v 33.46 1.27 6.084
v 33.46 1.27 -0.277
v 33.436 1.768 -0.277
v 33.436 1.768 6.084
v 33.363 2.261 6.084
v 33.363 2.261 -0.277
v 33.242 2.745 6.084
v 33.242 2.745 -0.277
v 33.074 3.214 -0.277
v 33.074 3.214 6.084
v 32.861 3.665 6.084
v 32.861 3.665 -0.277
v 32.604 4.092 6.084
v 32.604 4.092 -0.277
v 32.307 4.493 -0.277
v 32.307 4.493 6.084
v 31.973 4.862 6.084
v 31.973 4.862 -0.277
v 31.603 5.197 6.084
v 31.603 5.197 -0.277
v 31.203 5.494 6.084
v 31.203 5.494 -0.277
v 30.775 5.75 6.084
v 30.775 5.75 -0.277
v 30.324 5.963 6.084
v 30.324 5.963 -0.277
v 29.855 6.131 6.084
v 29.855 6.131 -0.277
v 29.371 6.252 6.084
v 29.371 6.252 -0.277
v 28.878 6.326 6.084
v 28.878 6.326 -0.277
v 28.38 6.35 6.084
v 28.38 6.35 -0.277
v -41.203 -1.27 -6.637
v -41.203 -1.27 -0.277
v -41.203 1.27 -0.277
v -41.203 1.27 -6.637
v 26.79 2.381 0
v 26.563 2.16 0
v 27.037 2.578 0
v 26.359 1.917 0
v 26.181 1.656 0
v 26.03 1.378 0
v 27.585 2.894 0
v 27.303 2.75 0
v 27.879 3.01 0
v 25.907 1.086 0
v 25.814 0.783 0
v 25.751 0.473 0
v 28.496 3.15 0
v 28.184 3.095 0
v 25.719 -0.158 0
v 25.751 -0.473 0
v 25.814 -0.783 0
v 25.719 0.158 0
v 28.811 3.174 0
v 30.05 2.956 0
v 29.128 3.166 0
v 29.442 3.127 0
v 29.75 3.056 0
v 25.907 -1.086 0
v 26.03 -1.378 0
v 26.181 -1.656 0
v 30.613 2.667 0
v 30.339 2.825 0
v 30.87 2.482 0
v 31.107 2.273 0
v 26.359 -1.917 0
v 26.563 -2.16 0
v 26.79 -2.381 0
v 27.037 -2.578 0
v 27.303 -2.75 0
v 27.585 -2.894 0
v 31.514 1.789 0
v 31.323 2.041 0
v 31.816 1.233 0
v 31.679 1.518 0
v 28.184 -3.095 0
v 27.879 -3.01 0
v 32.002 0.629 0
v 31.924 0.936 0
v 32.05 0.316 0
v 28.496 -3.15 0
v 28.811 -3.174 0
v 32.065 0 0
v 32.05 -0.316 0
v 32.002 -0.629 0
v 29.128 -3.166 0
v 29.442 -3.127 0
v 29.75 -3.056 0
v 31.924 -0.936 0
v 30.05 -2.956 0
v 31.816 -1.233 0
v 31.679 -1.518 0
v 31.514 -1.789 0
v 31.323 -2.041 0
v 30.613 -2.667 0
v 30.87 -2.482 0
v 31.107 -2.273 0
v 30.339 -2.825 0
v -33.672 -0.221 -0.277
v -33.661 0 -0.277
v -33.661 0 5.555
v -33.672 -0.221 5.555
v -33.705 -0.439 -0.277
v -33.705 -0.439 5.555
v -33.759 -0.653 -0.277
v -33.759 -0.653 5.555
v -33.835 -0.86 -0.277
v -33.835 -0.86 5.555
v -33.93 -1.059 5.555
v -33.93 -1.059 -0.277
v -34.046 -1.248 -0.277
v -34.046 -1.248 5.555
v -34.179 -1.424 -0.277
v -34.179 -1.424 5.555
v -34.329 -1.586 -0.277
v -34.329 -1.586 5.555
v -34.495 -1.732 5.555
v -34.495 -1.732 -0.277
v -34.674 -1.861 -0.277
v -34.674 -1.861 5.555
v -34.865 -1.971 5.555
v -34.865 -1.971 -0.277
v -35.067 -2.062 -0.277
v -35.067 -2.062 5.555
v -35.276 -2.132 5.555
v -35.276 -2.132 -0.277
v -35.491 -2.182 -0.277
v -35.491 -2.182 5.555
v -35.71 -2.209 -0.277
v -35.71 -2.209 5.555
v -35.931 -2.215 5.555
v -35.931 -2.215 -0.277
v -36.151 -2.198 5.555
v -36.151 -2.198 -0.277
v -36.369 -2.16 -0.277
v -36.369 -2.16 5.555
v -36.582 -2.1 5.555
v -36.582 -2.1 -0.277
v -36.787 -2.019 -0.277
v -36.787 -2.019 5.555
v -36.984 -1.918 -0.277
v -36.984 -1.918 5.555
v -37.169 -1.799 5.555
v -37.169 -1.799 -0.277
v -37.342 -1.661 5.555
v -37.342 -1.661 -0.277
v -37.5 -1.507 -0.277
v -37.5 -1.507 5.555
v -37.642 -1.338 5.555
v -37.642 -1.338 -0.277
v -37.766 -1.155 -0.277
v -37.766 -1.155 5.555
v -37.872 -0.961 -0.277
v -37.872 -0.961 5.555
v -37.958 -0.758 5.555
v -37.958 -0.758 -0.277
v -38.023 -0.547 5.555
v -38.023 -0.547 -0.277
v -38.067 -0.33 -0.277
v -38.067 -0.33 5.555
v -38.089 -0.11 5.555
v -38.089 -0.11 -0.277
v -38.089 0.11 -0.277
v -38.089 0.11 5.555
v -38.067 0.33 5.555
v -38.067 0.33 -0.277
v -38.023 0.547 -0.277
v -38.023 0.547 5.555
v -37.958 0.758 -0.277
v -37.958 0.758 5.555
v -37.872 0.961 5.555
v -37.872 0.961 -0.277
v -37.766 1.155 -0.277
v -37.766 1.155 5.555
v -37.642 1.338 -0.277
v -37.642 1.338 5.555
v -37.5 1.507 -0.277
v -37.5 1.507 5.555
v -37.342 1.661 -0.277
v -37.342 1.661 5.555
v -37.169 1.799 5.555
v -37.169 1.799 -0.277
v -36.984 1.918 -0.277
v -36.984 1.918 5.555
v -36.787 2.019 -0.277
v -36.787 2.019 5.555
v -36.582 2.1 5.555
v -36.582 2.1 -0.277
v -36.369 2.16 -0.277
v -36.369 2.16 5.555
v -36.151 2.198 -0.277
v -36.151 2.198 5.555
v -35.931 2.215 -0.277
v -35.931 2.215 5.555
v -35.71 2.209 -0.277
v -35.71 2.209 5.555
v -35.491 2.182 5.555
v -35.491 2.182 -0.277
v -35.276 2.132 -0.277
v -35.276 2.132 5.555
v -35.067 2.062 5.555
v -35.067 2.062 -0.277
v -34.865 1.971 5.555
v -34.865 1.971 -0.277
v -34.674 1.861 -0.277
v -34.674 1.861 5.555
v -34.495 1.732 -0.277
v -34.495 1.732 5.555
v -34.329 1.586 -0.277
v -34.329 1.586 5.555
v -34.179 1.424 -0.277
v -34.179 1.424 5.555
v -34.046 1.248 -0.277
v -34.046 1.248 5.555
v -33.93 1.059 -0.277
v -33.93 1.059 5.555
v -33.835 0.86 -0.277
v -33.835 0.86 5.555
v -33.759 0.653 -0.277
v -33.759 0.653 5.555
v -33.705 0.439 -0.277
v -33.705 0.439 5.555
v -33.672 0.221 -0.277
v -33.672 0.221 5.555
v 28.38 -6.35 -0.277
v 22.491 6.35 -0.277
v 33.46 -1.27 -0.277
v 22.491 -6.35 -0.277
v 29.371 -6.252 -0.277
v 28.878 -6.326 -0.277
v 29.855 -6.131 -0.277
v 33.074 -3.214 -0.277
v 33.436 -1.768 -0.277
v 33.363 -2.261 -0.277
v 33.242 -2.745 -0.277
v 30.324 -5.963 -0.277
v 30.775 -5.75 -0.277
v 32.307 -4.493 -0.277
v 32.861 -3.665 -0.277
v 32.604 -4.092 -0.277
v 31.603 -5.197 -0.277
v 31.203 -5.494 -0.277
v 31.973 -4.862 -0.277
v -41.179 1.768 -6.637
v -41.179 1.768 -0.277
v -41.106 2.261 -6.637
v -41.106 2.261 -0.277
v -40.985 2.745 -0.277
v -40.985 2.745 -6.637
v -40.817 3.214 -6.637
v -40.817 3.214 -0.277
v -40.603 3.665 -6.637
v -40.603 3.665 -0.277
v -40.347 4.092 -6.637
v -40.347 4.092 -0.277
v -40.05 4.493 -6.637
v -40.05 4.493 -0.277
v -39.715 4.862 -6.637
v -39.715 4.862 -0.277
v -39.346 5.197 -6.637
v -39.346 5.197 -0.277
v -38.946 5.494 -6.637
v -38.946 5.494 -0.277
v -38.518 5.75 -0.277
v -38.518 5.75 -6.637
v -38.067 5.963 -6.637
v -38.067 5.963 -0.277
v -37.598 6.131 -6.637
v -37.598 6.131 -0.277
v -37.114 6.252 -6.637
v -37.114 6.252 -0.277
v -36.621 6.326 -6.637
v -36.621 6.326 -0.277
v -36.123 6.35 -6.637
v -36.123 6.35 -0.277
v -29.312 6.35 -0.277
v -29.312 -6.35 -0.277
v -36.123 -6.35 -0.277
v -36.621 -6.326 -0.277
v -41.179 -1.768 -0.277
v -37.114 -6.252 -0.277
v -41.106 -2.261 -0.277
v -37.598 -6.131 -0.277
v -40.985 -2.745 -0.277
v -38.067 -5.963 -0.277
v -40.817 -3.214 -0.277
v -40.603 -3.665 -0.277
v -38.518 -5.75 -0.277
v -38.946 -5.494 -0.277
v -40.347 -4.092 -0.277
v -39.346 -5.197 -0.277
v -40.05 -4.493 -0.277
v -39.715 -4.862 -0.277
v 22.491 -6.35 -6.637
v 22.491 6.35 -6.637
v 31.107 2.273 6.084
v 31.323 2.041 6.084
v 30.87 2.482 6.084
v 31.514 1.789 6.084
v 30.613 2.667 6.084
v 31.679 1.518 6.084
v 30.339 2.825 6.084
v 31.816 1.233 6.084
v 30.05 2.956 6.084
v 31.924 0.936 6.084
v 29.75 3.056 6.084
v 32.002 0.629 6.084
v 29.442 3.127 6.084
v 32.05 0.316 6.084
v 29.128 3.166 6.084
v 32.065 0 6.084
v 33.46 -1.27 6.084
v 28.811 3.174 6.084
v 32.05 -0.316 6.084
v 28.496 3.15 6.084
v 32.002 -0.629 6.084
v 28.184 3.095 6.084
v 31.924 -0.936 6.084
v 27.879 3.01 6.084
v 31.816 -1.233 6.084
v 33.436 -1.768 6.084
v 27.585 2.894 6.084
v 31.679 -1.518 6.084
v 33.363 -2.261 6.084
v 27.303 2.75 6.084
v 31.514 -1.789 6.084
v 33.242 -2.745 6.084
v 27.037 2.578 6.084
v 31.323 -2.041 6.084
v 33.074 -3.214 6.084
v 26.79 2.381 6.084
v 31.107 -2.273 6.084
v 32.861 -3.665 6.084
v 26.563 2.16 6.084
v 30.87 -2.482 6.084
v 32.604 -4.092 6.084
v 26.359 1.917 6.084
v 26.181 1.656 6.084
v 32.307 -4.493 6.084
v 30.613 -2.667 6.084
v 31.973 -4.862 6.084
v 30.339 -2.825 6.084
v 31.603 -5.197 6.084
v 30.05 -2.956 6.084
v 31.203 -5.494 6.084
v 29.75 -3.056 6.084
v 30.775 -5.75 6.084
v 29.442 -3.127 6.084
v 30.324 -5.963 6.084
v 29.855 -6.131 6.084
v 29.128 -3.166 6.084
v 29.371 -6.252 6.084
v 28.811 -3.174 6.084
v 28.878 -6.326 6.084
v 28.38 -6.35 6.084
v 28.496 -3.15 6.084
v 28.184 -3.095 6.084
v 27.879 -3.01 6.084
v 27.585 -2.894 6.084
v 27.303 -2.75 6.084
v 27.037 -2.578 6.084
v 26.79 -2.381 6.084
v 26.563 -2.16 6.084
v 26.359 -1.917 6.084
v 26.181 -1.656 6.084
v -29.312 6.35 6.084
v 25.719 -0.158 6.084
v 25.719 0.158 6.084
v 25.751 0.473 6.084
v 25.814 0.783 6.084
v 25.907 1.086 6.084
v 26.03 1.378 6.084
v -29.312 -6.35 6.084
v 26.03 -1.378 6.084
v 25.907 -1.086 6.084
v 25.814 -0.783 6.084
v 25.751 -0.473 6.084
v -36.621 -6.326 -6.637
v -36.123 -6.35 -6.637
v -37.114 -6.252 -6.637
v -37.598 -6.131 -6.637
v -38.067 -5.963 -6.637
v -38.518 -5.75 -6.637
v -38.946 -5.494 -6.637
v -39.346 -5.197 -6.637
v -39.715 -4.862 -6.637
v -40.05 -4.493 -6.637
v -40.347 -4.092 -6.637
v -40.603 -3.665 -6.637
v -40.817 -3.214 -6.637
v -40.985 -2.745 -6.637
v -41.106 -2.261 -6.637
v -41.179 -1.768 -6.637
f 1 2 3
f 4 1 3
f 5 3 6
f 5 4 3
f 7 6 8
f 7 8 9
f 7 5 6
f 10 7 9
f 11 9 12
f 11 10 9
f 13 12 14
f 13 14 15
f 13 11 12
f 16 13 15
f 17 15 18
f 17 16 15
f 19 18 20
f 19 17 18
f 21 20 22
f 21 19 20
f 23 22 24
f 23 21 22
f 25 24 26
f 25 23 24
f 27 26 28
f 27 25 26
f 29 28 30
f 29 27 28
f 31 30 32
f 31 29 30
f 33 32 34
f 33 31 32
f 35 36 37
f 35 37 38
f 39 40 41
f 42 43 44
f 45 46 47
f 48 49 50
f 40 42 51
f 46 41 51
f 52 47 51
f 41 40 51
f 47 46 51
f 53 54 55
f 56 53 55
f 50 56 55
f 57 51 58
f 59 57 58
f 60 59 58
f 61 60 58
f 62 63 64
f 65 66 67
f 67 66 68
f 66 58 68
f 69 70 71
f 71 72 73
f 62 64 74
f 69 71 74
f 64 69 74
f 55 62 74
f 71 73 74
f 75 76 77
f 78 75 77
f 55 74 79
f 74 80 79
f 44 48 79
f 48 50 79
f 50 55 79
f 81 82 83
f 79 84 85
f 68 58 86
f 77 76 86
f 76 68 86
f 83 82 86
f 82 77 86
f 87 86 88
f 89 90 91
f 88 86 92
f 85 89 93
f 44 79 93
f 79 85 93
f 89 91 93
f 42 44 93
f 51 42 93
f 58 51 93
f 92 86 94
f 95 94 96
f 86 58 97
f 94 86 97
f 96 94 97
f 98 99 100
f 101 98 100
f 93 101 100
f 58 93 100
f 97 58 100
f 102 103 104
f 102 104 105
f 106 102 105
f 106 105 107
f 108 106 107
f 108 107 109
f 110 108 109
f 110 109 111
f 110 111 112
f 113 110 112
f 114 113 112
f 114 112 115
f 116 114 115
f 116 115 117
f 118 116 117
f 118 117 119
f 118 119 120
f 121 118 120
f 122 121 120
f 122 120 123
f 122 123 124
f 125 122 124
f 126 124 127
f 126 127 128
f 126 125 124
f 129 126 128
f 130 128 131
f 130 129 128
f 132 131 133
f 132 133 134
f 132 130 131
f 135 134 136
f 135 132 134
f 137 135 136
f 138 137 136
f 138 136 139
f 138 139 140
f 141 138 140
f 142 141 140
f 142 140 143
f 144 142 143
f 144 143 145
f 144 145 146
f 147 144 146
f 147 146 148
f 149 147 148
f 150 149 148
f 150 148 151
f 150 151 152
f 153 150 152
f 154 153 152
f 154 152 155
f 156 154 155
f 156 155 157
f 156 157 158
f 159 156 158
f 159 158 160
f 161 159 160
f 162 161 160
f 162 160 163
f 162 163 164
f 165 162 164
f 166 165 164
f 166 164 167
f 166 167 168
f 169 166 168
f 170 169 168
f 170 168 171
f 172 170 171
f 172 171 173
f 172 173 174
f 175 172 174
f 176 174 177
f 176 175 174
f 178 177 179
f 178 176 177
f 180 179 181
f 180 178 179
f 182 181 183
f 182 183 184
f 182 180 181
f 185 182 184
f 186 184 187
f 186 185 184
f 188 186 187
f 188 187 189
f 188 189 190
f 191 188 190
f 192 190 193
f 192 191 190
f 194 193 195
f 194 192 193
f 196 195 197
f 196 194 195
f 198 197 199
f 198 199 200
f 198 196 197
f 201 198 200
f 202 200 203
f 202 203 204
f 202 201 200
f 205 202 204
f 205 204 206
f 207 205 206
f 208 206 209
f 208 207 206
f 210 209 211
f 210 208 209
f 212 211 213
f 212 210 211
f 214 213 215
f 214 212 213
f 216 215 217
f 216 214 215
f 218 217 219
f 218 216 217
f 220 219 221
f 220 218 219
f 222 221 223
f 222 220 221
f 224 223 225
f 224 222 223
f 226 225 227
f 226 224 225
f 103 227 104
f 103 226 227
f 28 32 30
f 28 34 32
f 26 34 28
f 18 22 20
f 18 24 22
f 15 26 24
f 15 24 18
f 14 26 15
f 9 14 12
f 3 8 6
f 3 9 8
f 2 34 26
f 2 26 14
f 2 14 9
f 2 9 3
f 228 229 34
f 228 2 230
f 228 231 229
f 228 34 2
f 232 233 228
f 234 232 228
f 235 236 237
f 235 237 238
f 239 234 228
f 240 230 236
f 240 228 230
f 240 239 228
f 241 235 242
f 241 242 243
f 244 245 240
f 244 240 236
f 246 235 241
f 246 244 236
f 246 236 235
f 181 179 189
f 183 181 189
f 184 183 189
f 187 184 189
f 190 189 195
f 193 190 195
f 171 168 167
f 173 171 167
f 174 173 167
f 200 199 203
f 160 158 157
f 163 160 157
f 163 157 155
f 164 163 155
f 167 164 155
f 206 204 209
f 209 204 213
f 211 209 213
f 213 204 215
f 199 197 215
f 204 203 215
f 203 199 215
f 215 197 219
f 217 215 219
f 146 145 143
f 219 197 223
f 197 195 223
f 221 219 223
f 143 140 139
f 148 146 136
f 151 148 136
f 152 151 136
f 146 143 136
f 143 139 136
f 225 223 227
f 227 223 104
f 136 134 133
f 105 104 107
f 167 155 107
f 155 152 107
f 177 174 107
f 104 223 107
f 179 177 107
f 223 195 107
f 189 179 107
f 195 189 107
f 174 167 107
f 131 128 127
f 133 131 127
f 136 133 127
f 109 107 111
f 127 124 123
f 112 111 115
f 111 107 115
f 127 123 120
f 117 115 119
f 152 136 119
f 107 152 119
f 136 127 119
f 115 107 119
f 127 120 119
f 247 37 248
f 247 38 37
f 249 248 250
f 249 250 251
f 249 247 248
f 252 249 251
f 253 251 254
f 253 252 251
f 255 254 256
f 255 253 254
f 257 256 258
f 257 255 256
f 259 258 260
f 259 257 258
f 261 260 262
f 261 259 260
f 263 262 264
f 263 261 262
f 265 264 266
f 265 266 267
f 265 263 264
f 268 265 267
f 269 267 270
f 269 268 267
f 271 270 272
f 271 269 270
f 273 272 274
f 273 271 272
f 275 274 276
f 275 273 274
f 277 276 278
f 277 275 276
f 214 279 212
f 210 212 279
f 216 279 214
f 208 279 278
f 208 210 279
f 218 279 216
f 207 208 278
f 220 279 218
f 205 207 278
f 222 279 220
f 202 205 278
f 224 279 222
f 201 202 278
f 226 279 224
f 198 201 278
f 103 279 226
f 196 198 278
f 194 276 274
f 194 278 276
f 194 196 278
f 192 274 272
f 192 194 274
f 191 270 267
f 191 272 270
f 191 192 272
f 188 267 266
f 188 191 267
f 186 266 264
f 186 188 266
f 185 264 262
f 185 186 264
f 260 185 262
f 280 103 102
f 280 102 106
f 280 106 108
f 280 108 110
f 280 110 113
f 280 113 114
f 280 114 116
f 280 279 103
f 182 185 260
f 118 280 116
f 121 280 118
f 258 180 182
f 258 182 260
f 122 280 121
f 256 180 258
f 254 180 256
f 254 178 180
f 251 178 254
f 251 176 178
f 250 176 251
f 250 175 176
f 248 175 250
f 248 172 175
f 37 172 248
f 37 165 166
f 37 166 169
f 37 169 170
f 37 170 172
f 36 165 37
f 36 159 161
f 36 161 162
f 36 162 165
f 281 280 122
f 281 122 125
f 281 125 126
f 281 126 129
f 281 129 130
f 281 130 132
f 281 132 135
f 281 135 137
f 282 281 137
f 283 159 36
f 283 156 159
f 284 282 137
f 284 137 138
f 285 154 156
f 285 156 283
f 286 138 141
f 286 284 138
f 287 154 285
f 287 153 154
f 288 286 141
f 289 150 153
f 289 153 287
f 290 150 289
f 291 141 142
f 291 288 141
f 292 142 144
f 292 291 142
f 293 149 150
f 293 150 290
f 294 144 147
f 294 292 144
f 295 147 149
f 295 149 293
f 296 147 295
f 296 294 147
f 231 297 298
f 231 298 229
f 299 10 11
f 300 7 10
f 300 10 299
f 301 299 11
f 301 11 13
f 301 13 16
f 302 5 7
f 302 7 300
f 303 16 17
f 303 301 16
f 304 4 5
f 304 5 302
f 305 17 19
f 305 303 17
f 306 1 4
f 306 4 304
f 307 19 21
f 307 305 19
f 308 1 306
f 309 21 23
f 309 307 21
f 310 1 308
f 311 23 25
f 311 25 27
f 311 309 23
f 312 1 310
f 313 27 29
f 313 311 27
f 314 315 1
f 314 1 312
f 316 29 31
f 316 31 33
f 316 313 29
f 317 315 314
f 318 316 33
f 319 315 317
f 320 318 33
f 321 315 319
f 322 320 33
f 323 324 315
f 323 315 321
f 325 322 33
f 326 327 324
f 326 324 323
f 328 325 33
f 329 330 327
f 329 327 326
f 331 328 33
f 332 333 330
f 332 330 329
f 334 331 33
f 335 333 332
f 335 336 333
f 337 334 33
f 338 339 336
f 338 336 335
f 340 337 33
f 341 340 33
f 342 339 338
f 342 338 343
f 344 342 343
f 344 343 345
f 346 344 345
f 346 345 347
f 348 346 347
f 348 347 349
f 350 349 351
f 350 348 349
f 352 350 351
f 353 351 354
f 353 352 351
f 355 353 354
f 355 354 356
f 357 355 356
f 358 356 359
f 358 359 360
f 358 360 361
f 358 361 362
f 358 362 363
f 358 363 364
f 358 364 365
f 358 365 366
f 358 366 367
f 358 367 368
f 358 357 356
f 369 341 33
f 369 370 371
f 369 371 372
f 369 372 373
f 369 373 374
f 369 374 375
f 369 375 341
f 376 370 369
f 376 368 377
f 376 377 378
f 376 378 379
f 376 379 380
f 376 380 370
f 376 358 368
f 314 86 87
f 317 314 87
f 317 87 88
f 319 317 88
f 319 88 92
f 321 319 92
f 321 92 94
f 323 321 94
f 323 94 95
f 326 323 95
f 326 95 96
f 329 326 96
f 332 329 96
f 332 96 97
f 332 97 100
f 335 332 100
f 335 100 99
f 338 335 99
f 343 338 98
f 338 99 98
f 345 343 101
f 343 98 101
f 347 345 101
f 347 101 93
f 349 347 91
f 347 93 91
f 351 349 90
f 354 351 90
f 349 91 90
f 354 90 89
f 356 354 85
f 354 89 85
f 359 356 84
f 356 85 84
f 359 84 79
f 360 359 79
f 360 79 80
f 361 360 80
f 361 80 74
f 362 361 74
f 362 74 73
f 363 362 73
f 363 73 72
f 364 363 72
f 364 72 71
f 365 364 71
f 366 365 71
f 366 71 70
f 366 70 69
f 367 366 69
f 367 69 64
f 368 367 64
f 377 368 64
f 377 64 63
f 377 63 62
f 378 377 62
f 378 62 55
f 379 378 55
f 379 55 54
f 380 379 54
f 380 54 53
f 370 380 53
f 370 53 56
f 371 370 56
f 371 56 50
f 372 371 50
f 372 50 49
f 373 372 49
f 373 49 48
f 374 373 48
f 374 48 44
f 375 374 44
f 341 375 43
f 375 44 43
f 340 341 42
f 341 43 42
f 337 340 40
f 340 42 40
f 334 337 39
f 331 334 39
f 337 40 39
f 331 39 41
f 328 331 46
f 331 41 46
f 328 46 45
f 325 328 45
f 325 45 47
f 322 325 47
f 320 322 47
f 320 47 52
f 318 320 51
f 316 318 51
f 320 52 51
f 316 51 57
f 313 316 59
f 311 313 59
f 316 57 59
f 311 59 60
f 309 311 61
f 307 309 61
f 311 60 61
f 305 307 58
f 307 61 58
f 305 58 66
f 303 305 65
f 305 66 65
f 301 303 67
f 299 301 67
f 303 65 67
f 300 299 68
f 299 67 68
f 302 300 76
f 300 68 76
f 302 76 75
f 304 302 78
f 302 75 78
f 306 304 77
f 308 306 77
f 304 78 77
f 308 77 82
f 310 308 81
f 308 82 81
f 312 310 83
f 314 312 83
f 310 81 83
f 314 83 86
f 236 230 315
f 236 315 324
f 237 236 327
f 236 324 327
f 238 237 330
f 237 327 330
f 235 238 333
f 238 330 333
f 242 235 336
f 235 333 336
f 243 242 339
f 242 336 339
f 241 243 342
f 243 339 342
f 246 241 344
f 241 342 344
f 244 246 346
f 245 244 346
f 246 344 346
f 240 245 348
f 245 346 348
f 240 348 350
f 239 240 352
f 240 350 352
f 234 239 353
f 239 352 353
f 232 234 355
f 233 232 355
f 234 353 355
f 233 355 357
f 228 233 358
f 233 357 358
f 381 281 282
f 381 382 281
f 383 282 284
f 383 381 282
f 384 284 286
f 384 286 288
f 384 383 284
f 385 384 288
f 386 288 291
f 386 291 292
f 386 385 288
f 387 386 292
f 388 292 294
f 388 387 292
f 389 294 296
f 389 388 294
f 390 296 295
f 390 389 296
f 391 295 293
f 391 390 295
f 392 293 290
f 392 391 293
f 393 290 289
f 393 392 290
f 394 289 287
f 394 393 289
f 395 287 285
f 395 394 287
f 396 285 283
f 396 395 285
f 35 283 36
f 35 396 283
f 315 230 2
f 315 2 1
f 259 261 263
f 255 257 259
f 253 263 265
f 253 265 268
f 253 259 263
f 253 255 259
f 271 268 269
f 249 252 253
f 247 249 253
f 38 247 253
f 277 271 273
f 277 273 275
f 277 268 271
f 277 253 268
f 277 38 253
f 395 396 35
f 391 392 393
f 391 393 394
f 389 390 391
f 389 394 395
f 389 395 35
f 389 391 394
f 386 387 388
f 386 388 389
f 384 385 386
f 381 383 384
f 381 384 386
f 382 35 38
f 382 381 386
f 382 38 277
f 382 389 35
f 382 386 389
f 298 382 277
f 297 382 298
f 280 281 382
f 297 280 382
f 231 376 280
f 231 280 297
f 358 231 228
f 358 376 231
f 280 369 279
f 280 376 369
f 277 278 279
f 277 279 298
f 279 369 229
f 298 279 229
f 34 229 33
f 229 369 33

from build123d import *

# Parameters (mm, degrees)
F0_W     = 10.9691135585
F0_H     = 6.3602421433
F1_DEPTH = 6.35
F2_DEPTH = 6.35
F3_R     = 5.08
F5_D     = 6.35
F5_DEPTH = 6.0847096535
F6_R     = 2.2152679596
F7_DEPTH = 12.192


with BuildPart() as f1:
    # F0 (on Front) → F1 (new body)
    with BuildSketch(Plane.XZ):
        Polygon((-29.3124206364, -6.6367746331), (-29.3124206364, -0.2765324898), (-33.8291116059, -0.2765324898), (-37.5162102282, -0.2765324898), (-41.2033051252, -0.2765324898), (-41.2033051252, -6.6367746331), align=None)
        Polygon((22.4912911654, 6.0837096535), (-29.3124206364, 6.0837096535), (-29.3124206364, -0.2765324898), (-29.3124206364, -6.6367746331), (22.4912911654, -6.6367746331), (22.4912911654, -0.2765324898), align=None)
        with Locations((27.9758479446, 2.9035885818)):
            Rectangle(F0_W, F0_H)
    extrude(amount=F1_DEPTH)

    # F2 (add): a face of the model
    f2_faces = [f1.faces().sort_by_distance(p)[0] for p in [
        (-3.6826618353, 0, -0.2997111323),
    ]]
    extrude(f2_faces, amount=F2_DEPTH)

    # F3
    f3_edges = [f1.edges().sort_by_distance(p)[0] for p in [
        (-41.203305, -6.35, -3.456654),
        (-41.203305, 6.35, -3.456654),
        (33.460405, -6.35, 2.903589),
        (33.460405, 6.35, 2.903589),
    ]]
    fillet(f3_edges, radius=F3_R)

    # F5 (through all, one way)
    with BuildSketch(Plane(origin=(0, 0, 0), x_dir=(1, 0, 0), z_dir=(0, 0, -1))):
        with Locations((28.8903526962, 0)):
            Circle(F5_D / 2)
    extrude(amount=-F5_DEPTH, mode=Mode.SUBTRACT)

    # F6 (on face) → F7 (join)
    with BuildSketch(Plane(origin=(0, 0, -6.6367746331), x_dir=(1, 0, 0), z_dir=(0, 0, -1))):
        with Locations((-35.8759947121, 0)):
            Circle(F6_R)
    extrude(amount=-F7_DEPTH)


solid = f1.part
